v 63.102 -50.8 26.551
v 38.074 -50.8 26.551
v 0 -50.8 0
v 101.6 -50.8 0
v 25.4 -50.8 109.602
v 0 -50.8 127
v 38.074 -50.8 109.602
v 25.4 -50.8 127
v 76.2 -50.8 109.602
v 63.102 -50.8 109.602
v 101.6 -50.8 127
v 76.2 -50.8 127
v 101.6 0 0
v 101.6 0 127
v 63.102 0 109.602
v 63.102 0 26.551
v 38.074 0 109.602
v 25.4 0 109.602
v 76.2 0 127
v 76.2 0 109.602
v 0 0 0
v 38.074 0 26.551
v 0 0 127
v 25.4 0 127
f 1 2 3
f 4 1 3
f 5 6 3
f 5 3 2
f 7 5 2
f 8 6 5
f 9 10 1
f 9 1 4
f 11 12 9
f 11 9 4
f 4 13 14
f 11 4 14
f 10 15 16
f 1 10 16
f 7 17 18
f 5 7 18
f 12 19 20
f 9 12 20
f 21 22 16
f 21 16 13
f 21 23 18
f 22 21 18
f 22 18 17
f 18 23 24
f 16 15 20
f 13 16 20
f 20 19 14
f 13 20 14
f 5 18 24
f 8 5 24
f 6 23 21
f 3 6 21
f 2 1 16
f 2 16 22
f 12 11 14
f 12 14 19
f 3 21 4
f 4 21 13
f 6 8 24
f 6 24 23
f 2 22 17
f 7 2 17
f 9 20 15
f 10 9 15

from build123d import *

# Parameters (mm, degrees)
F1_DEPTH = 50.8
F3_DEPTH = 508


with BuildPart() as f1:
    # F0 (on Front) → F1 (new body)
    with BuildSketch(Plane.XZ):
        Polygon((0, 127), (0, 0), (101.6, 0), (101.6, 127), (76.2, 127), (76.2, 109.6020500779), (63.1024986506, 109.6020500779), (63.1024986506, 90.5520500779), (63.1024986506, 26.5513639897), (38.0738861859, 26.5513639897), (38.0738861859, 90.5520500779), (38.0738861859, 109.6020500779), (25.4, 109.6020500779), (25.4, 127), align=None)
    extrude(amount=F1_DEPTH)

    # F2 (on face) → F3 (cut)
    with BuildSketch(Plane.XY.offset(26.5513639897)):
        with BuildLine():
            Line((63.1024986506, -39.3377331106), (63.1024986506, -9.0668934377))
            ThreePointArc((63.1024986506, -9.0668934377), (50.5881924182, -4.5633521483), (38.0738861859, -9.0668934377))
            Line((38.0738861859, -9.0668934377), (38.0738861859, -39.3377331106))
            ThreePointArc((38.0738861859, -39.3377331106), (50.5881924182, -43.8412744), (63.1024986506, -39.3377331106))
        make_face()
    extrude(amount=F3_DEPTH, mode=Mode.SUBTRACT)


solid = f1.part
